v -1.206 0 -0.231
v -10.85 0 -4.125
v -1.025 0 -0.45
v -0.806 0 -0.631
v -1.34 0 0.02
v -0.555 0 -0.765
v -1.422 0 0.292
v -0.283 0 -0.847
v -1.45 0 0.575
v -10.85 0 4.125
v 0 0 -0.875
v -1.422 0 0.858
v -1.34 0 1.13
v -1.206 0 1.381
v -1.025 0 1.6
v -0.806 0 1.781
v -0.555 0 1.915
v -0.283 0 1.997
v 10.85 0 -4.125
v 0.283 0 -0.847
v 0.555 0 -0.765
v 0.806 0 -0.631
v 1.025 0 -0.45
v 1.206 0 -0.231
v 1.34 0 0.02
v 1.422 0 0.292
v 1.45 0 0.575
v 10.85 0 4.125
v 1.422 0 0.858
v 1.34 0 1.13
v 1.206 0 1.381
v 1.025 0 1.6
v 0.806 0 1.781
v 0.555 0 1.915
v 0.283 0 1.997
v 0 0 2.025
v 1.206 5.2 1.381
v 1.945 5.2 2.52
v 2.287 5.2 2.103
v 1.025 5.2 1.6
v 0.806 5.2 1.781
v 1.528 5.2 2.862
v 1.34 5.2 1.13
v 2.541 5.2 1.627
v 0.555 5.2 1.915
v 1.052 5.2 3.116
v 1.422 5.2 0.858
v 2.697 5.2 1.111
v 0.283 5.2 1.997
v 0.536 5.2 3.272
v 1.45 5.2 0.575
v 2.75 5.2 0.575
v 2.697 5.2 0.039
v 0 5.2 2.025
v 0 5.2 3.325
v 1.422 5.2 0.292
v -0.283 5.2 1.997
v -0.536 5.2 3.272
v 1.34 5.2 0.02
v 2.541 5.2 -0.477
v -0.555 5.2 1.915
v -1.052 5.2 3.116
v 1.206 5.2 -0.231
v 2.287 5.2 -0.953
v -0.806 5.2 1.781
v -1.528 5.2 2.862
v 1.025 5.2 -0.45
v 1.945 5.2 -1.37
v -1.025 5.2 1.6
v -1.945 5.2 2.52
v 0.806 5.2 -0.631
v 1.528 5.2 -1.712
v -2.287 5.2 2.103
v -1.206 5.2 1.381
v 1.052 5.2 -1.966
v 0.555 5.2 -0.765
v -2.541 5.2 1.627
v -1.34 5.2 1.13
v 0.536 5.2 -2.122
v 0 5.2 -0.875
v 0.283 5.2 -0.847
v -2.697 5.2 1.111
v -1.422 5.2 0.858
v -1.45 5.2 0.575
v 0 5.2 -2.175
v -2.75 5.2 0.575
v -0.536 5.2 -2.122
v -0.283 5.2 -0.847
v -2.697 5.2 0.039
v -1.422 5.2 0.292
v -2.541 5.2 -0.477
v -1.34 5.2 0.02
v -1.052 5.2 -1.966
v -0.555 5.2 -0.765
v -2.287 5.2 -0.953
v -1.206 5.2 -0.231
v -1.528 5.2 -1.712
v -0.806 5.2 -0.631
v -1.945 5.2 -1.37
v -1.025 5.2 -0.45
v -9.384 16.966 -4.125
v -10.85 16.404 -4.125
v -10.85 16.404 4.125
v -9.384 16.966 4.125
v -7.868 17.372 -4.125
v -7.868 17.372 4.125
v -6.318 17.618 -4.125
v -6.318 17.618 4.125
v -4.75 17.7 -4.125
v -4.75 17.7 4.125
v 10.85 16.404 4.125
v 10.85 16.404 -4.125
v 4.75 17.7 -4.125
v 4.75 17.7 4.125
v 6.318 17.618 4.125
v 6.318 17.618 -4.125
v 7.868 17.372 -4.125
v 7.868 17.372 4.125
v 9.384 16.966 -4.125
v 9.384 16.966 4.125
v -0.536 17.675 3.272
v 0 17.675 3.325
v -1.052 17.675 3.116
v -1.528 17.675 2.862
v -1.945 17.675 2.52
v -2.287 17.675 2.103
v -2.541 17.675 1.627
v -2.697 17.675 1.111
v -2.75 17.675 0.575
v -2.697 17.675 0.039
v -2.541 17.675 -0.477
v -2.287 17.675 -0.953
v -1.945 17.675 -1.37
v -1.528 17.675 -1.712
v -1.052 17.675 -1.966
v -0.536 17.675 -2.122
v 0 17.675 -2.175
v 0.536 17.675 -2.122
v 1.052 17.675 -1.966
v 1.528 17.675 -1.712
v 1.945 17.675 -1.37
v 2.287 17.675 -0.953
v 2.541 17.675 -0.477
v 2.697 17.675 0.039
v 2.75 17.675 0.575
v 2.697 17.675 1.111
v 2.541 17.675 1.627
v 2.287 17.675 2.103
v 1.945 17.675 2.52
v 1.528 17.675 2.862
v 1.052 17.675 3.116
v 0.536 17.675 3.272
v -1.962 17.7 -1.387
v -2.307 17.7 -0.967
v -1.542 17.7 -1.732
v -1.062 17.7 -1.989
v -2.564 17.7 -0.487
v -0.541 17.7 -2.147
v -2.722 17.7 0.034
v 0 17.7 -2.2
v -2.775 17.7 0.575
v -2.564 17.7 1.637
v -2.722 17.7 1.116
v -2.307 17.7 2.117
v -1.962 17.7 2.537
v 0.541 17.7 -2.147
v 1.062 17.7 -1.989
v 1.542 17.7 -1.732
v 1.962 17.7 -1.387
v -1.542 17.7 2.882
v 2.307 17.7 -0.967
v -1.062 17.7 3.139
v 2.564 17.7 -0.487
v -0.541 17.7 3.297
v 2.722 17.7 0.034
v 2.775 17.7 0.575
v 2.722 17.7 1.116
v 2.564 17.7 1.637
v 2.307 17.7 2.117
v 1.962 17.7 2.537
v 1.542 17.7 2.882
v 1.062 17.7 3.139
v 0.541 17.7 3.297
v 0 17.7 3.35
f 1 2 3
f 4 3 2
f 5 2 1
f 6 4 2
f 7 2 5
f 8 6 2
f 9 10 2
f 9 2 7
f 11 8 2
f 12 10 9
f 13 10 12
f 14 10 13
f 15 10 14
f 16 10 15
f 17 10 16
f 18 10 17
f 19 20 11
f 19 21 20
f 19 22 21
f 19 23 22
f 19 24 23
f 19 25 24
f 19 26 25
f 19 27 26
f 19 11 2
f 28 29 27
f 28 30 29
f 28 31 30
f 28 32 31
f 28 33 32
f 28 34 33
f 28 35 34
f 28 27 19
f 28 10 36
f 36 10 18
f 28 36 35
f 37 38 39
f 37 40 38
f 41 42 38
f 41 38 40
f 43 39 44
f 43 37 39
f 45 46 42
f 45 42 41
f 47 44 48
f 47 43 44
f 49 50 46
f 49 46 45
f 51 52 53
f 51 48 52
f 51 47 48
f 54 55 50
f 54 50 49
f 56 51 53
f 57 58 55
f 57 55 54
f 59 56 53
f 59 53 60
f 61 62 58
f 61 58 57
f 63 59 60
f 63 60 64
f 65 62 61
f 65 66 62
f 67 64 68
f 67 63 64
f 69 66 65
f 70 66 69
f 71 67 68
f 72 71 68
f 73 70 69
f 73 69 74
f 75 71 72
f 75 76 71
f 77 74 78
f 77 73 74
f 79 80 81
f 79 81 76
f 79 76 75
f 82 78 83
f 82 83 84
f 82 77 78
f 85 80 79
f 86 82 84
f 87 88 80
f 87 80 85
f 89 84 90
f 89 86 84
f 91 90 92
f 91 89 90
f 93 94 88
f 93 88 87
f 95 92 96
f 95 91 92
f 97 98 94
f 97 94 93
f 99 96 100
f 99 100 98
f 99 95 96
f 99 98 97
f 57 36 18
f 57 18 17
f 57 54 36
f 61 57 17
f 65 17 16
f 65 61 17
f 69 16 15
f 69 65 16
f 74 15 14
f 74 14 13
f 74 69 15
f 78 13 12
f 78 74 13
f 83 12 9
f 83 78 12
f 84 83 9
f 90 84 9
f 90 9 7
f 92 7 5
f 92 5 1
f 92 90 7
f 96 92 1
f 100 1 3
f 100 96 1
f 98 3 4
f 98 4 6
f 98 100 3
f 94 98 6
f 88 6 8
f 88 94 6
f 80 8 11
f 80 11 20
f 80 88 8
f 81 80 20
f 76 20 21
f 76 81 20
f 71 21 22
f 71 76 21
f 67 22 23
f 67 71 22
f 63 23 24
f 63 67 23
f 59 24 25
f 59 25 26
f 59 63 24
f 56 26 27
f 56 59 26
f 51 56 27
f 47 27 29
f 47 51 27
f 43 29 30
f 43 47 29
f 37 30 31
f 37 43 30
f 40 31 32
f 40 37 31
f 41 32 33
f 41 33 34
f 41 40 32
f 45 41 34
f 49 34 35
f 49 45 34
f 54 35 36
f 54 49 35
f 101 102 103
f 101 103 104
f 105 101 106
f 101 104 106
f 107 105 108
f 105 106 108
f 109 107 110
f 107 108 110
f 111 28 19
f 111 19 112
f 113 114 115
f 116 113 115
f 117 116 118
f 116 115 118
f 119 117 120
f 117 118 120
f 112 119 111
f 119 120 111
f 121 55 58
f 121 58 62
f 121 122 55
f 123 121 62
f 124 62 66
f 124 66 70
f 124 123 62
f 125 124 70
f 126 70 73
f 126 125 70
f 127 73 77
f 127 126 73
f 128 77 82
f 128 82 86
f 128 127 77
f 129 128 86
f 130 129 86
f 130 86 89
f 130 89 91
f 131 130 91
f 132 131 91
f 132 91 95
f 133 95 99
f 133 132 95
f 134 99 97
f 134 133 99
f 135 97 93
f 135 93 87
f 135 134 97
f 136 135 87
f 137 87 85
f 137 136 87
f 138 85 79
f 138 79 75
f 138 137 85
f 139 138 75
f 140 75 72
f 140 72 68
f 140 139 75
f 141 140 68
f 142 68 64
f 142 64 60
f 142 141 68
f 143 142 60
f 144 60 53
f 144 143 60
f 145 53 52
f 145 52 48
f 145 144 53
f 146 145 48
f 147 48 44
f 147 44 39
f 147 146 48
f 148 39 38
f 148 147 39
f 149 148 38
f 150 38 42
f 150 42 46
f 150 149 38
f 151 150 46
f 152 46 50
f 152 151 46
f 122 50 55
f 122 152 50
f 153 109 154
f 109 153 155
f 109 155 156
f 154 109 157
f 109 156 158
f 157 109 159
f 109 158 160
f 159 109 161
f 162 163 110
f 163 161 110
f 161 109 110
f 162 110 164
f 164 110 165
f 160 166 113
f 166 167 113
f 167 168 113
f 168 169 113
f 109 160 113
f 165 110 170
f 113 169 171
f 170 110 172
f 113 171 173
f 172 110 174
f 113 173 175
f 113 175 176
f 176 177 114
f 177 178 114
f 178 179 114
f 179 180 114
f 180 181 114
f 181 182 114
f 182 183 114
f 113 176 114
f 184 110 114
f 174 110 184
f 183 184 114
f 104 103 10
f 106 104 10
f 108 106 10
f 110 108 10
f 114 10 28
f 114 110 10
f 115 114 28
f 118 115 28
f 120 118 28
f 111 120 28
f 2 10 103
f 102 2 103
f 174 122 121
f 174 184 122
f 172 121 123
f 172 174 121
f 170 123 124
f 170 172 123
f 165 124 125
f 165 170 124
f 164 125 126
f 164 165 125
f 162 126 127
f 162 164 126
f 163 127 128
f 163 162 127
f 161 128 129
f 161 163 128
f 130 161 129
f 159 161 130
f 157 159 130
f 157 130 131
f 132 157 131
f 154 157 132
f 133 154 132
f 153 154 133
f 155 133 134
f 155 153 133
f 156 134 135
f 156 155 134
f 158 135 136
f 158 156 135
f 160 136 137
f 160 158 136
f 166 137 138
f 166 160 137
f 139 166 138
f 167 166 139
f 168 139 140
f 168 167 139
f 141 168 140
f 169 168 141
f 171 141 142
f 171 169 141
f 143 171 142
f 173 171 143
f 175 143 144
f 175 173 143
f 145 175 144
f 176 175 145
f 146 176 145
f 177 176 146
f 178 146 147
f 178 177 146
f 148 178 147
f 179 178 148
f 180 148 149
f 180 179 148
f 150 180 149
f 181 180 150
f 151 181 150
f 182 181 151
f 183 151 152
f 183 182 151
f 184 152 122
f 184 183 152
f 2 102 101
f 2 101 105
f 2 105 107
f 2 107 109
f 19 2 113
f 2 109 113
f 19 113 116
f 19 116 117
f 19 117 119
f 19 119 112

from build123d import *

# Parameters (mm, degrees)
SKETCH1_W           = 21.7
SKETCH1_H           = 17.7
BOSS_EXTRUDE1_DEPTH = 4.125
SKETCH3_OUTSIDE_W   = 29.538
SKETCH3_OUTSIDE_H   = 25.538
CUT_EXTRUDE1_DEPTH  = 8.25


with BuildPart() as part:
    # Sketch1 → Boss-Extrude1 (new, symmetric)
    with BuildSketch(Plane.XY):
        with Locations((0, 8.85)):
            Rectangle(SKETCH1_W, SKETCH1_H)
    extrude(amount=BOSS_EXTRUDE1_DEPTH, both=True)

    # Sketch3 outside → Cut-Extrude1 (cut)
    with BuildSketch(Plane.XY.offset(4.125)):
        with Locations((0, 8.85)):
            Rectangle(SKETCH3_OUTSIDE_W, SKETCH3_OUTSIDE_H)
        with BuildLine():
            Line((-4.75, 17.7), (4.75, 17.7))
            ThreePointArc((4.75, 17.7), (19.75, 2.7), (4.75, -12.3))
            Line((4.75, -12.3), (-4.75, -12.3))
            ThreePointArc((-4.75, -12.3), (-19.75, 2.7), (-4.75, 17.7))
        make_face(mode=Mode.SUBTRACT)
    extrude(amount=-CUT_EXTRUDE1_DEPTH, mode=Mode.SUBTRACT)

    # Sketch5 → CBORE for M2.5 SHCS1 (revolve, cut)
    with BuildSketch(Plane(origin=(0, 17.7, 0.575), x_dir=(0, 0, 1), z_dir=(1, 0, 0))):
        Polygon((0, 0), (0, 17.7), (1.45, 17.7), (1.45, 12.5), (2.75, 12.5), (2.75, 0.025), (2.775, 0), align=None)
    revolve(axis=Axis((0, 24.05, 0.575), (0, -1, 0)), mode=Mode.SUBTRACT)


solid = part.part
